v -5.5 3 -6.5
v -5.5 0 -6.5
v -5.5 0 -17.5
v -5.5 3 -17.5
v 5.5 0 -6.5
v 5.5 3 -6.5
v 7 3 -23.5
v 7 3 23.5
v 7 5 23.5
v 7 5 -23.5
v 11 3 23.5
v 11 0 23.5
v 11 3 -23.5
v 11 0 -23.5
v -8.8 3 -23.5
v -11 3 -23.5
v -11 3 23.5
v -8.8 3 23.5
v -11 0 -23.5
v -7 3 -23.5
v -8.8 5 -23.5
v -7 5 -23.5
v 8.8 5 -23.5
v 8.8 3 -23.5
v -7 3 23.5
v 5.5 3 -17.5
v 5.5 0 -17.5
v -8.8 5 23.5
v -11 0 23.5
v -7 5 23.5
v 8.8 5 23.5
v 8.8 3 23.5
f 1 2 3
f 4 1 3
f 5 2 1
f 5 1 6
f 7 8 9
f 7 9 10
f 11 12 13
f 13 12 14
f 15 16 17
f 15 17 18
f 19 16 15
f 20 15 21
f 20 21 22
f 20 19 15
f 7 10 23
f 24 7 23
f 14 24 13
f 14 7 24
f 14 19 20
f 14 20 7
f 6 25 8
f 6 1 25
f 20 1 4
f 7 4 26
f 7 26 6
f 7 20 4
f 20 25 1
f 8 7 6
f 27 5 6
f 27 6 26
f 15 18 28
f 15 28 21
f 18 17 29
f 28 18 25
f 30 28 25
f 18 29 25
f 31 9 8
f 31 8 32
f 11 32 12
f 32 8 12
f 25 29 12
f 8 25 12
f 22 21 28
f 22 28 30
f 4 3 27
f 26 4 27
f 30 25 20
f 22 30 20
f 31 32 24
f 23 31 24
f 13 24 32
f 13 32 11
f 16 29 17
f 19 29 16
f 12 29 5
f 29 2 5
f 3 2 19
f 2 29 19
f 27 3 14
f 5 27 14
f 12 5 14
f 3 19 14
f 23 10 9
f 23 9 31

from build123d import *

# Parameters (mm, degrees)
SKETCH1_W           = 22
SKETCH1_H           = 47
SKETCH1_W_2         = 11
SKETCH1_H_2         = 11
BOSS_EXTRUDE_DEPTH  = 3
SKETCH5_W           = 1.8
SKETCH5_H           = 47
BOSS_EXTRUDE1_DEPTH = 2


with BuildPart() as part:
    # Sketch1 → Boss-Extrude (new body)
    with BuildSketch(Plane(origin=(0, 0, 0), x_dir=(1, 0, 0), z_dir=(0, 1, 0))):
        Rectangle(SKETCH1_W, SKETCH1_H)
        with Locations((0, 12)):
            Rectangle(SKETCH1_W_2, SKETCH1_H_2, mode=Mode.SUBTRACT)
    extrude(amount=BOSS_EXTRUDE_DEPTH)

    # Sketch5 → Boss-Extrude1 (add)
    with BuildSketch(Plane(origin=(0, 3, 0), x_dir=(1, 0, 0), z_dir=(0, 1, 0))):
        with Locations((-7.9, 0)):
            Rectangle(SKETCH5_W, SKETCH5_H)
        with Locations((7.9, 0)):
            Rectangle(SKETCH5_W, SKETCH5_H)
    extrude(amount=BOSS_EXTRUDE1_DEPTH)


solid = part.part
